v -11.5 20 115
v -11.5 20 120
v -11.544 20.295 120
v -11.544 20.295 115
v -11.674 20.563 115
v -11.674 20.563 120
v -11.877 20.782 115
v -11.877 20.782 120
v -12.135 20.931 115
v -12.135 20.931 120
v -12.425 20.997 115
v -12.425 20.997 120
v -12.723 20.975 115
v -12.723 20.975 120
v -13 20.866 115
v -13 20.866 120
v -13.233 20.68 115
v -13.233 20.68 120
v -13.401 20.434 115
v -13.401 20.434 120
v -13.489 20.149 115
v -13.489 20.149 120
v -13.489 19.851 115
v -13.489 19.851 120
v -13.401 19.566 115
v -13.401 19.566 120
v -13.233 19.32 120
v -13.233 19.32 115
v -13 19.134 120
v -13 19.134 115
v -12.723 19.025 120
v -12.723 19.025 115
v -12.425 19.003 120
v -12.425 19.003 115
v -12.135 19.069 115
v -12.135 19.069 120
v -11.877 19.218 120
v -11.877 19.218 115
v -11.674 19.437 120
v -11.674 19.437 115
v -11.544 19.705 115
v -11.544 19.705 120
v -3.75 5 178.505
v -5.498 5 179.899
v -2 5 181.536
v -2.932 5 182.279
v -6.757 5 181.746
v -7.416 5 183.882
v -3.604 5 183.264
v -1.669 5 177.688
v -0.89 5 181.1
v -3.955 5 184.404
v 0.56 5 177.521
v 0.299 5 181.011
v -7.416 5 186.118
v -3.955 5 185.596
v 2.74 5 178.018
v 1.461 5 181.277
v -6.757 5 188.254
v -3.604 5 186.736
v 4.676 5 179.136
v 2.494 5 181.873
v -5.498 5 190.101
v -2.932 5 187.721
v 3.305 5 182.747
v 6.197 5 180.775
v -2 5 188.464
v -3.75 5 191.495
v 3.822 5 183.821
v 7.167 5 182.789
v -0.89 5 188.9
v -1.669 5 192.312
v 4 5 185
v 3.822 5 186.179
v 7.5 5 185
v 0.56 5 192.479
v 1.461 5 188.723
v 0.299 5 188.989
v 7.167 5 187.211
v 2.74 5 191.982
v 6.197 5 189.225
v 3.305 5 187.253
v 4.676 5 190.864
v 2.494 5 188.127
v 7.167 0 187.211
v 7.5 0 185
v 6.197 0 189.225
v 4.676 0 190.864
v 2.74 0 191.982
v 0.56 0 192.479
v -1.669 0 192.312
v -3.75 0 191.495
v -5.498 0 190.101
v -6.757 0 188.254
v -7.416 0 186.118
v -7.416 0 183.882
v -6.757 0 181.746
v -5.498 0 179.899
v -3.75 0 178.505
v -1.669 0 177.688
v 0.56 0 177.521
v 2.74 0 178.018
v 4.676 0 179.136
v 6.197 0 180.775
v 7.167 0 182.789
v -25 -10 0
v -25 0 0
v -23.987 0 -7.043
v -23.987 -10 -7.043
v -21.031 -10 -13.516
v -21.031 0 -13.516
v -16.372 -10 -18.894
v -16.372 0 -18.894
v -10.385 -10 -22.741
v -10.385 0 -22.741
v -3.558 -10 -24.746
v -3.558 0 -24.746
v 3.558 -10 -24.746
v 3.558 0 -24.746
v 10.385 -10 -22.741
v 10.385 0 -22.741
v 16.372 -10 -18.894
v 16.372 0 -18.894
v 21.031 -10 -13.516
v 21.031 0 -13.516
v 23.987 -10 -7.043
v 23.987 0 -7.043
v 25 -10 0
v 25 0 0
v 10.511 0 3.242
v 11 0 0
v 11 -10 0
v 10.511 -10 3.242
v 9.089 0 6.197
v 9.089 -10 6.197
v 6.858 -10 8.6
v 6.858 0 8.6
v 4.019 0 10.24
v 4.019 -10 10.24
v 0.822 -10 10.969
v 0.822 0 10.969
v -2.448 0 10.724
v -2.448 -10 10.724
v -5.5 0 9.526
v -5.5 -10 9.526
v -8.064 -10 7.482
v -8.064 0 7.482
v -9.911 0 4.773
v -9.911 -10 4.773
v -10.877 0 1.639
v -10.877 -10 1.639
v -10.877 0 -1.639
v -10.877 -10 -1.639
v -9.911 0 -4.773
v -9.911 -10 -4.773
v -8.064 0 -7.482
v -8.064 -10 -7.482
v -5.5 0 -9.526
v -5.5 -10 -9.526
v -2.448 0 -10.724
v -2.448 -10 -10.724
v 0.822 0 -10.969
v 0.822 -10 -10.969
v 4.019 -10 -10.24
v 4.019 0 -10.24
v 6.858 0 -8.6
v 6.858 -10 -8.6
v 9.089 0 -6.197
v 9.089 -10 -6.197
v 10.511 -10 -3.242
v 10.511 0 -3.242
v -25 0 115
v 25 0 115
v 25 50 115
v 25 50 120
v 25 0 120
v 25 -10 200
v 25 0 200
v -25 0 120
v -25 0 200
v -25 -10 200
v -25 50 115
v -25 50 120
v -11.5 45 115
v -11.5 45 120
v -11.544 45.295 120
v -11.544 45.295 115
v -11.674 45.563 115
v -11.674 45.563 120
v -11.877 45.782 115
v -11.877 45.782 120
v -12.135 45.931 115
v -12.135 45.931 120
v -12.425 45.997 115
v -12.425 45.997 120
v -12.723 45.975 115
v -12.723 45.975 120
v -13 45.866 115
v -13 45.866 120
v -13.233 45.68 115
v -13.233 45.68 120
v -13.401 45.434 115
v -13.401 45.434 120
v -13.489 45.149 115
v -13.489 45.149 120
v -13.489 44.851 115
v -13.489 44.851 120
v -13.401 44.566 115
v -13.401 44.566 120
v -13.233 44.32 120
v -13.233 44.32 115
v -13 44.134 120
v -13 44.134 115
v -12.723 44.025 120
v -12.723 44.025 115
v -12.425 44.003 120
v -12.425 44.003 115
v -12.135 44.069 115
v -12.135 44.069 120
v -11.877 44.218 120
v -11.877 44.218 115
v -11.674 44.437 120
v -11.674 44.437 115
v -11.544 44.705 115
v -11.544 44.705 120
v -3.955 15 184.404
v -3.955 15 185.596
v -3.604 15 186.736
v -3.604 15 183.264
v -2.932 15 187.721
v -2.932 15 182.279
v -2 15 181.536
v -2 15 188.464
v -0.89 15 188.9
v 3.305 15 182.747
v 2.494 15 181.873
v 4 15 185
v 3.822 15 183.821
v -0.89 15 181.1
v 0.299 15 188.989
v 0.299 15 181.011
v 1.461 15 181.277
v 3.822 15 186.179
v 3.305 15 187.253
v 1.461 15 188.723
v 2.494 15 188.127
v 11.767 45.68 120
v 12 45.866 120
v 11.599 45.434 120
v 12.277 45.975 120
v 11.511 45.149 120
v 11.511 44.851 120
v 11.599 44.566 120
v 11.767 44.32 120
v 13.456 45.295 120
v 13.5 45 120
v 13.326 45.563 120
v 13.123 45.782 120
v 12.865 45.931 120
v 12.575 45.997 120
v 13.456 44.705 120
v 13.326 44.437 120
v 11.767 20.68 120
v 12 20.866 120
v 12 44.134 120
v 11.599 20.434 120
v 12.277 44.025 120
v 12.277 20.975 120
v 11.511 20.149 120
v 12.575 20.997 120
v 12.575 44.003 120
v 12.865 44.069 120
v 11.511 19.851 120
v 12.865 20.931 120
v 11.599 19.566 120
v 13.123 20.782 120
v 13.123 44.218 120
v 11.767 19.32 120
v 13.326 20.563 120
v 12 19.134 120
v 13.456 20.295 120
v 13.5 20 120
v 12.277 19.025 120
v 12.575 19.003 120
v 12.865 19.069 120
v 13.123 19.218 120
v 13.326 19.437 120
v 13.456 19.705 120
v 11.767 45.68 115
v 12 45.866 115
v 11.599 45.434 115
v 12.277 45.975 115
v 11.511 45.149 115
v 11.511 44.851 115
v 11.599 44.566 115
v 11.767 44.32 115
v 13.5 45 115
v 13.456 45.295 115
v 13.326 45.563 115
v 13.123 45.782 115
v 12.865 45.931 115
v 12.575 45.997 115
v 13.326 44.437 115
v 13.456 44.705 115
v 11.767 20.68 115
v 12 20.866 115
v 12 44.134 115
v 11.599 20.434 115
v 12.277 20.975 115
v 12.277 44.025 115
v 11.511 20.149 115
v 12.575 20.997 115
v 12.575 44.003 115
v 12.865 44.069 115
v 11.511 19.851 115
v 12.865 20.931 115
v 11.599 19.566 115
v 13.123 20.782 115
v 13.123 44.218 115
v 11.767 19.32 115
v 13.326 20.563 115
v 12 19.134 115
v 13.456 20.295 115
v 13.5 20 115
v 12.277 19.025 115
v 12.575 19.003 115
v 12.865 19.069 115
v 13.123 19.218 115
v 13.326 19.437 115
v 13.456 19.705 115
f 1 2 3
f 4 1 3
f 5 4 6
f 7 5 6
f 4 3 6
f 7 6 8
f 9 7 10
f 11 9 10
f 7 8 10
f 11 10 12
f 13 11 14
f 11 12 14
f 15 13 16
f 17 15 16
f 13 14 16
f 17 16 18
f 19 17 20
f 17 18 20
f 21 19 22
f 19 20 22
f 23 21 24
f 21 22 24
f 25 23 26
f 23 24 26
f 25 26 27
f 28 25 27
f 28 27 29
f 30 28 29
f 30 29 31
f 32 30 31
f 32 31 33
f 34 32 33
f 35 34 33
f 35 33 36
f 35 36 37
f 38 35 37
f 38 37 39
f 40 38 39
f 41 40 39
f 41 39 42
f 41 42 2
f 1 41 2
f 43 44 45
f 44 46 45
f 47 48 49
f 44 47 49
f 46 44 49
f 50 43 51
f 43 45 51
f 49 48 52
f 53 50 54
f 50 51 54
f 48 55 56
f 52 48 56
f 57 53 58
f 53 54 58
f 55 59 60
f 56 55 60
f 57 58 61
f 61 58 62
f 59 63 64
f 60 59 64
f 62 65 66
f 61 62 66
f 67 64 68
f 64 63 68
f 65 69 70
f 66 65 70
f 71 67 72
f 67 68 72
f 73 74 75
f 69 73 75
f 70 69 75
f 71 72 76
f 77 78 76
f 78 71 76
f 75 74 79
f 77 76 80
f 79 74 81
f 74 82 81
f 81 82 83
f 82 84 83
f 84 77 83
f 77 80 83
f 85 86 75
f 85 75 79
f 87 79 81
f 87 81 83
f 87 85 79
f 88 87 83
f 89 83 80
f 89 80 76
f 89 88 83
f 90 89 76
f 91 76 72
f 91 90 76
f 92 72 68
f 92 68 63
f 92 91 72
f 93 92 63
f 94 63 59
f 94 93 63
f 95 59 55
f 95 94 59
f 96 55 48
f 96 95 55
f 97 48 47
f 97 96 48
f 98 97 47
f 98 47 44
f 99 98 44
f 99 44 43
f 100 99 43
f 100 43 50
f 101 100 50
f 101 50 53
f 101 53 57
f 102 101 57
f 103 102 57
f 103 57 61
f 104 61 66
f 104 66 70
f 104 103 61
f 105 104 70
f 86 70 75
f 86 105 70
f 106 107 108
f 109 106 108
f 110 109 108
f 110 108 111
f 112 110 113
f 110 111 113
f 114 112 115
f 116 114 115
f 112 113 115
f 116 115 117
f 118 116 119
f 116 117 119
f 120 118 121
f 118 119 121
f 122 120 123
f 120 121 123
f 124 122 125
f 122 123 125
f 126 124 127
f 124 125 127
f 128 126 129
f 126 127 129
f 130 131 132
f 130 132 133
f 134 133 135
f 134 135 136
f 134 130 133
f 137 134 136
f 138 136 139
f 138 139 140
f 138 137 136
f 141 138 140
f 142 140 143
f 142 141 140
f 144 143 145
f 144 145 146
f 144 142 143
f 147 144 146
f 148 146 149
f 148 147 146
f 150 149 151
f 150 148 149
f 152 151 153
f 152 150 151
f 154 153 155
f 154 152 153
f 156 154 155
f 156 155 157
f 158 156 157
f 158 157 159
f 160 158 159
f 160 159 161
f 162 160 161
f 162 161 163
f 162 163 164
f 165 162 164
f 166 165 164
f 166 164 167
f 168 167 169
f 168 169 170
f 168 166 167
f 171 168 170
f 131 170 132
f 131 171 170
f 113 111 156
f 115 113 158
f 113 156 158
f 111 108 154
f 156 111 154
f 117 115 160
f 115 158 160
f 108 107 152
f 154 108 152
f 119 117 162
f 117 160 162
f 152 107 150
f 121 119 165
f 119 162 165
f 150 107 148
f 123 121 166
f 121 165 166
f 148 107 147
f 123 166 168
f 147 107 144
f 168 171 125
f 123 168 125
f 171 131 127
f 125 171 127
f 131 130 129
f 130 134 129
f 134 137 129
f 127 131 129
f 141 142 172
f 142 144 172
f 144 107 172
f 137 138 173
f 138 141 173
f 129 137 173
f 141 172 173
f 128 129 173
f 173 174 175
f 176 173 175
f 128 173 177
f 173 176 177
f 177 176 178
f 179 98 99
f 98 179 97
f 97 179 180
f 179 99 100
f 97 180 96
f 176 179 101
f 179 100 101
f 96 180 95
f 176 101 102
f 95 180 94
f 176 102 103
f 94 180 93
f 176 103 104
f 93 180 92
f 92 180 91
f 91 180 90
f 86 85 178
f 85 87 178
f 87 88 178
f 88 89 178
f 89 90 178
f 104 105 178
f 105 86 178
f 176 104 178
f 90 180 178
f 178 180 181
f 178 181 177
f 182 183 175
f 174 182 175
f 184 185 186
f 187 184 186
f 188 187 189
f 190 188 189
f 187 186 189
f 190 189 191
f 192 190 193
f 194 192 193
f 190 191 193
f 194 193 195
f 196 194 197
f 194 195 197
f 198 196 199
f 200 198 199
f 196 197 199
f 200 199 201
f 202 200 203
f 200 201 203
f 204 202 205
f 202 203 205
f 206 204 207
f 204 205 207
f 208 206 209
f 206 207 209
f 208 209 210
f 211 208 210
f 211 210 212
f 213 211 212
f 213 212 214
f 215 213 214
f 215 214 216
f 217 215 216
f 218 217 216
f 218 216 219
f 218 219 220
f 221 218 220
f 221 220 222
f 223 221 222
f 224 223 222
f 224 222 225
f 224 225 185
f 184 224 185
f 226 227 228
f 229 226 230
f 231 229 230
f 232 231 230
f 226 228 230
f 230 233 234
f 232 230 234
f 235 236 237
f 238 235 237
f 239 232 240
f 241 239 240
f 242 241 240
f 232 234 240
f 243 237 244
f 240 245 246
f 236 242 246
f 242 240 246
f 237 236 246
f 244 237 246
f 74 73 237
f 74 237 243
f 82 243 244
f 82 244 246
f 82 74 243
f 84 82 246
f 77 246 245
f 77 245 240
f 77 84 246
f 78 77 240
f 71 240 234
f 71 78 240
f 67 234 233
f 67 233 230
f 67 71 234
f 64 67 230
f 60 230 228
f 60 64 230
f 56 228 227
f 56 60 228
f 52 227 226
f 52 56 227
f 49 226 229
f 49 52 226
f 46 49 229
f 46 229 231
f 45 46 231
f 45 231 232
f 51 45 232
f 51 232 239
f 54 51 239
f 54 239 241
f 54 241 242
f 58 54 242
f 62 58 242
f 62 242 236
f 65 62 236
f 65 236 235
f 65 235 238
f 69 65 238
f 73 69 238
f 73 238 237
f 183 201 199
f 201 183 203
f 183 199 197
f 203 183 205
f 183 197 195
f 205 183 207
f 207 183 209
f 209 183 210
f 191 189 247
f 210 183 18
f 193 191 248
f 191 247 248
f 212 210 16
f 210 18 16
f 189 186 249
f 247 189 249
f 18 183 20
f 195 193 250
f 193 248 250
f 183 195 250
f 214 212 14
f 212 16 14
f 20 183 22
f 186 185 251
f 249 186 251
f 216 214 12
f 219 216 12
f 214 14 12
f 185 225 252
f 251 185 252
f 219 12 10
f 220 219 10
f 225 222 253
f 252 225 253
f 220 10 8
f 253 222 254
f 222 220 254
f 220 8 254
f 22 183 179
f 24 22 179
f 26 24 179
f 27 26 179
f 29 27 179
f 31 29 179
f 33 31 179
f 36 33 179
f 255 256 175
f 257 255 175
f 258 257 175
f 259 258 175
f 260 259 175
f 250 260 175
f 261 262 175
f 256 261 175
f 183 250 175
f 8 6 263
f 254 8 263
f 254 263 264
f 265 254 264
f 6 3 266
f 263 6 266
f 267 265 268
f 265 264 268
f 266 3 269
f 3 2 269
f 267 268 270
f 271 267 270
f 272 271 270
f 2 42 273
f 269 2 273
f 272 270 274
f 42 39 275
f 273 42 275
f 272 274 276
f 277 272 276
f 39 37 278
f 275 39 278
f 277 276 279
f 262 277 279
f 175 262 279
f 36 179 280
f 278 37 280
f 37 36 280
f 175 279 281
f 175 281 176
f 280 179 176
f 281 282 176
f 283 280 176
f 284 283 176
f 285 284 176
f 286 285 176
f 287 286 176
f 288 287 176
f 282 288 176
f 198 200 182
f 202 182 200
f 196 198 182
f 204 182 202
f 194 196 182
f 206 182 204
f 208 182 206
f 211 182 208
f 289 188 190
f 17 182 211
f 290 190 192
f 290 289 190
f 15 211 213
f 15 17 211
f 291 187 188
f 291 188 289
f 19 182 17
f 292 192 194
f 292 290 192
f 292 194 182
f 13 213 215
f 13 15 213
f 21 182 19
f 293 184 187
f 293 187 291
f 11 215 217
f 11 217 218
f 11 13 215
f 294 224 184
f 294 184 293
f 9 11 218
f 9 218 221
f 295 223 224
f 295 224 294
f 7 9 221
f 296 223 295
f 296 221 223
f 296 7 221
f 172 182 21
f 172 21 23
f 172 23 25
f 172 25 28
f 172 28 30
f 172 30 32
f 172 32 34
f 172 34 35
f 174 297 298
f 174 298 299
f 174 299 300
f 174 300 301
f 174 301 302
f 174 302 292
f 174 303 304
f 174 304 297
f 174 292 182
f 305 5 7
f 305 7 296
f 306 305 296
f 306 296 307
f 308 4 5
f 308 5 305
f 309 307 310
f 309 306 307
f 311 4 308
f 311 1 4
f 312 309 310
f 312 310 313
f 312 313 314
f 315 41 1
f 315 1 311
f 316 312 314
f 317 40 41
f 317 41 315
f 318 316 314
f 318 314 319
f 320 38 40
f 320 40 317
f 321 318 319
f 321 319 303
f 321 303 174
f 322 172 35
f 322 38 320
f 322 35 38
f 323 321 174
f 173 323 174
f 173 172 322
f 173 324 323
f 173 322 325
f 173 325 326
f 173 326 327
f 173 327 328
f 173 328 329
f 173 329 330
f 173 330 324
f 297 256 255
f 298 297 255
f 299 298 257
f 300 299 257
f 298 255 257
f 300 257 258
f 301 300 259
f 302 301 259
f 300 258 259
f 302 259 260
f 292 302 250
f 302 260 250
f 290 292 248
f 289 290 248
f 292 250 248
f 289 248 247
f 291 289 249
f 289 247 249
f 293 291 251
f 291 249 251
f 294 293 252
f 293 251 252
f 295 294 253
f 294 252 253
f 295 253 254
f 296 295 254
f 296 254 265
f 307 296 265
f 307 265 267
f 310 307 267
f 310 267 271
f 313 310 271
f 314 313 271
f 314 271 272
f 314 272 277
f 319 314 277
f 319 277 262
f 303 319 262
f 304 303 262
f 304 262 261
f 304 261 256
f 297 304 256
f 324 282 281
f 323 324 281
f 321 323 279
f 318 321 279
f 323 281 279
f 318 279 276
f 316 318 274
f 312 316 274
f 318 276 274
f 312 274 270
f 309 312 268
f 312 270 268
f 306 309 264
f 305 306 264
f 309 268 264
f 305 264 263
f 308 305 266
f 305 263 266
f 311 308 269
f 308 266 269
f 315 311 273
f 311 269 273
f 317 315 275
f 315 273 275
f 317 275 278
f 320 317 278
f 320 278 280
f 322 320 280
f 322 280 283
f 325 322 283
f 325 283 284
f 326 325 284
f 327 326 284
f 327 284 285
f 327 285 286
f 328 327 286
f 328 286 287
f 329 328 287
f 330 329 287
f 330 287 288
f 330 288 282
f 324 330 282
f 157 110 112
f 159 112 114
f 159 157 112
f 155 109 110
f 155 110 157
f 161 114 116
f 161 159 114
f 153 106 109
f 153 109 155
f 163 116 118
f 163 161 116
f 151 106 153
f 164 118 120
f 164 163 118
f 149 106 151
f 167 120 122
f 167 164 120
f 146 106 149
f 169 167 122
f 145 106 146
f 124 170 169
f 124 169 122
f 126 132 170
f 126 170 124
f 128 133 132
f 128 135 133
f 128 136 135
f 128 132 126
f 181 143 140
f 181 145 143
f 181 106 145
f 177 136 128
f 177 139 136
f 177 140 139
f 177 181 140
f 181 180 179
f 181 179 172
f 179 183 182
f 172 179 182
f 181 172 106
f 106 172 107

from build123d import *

# Parameters (mm, degrees)
F0_R     = 11
F0_W     = 50
F0_H     = 5
F0_H_2   = 80
F0_R_2   = 7.5
F0_R_3   = 4
F1_DEPTH = 10
F2_DEPTH = 50
F3_R     = 1
F4_DEPTH = 25
F5_DEPTH = 5
F6_DEPTH = 15


with BuildPart() as f1:
    # F0 (on Front) → F1 (new body)
    with BuildSketch(Plane.XZ):
        with BuildLine():
            Line((-25, 115), (-25, 0))
            ThreePointArc((-25, 0), (0, -25), (25, 0))
            Line((25, 0), (25, 115))
            Line((25, 115), (-25, 115))
        make_face()
        Circle(F0_R, mode=Mode.SUBTRACT)
        with Locations((0, 117.5)):
            Rectangle(F0_W, F0_H)
        with Locations((0, 160)):
            Rectangle(F0_W, F0_H_2)
        with Locations((0, 185)):
            Circle(F0_R_2, mode=Mode.SUBTRACT)
        with Locations((0, 185)):
            Circle(F0_R_2)
        with Locations((0, 185)):
            Circle(F0_R_3, mode=Mode.SUBTRACT)
        with Locations((0, 185)):
            Circle(F0_R_3)
    extrude(amount=F1_DEPTH)

    # F0 (on Front) → F2 (join)
    with BuildSketch(Plane.XZ):
        with Locations((0, 117.5)):
            Rectangle(F0_W, F0_H)
    extrude(amount=-F2_DEPTH)

    # F3 (on face) → F4 (cut)
    with BuildSketch(Plane.XY.offset(120)):
        with Locations((-12.5, 20)):
            Circle(F3_R)
        with Locations((-12.5, 45)):
            Circle(F3_R)
        with Locations((12.5, 45)):
            Circle(F3_R)
        with Locations((12.5, 20)):
            Circle(F3_R)
    extrude(amount=-F4_DEPTH, mode=Mode.SUBTRACT)

    # F0 (on Front) → F5 (join)
    with BuildSketch(Plane.XZ):
        with Locations((0, 185)):
            Circle(F0_R_2)
        with Locations((0, 185)):
            Circle(F0_R_3, mode=Mode.SUBTRACT)
    extrude(amount=-F5_DEPTH)

    # F0 (on Front) → F6 (join)
    with BuildSketch(Plane.XZ):
        with Locations((0, 185)):
            Circle(F0_R_3)
    extrude(amount=-F6_DEPTH)


solid = f1.part
